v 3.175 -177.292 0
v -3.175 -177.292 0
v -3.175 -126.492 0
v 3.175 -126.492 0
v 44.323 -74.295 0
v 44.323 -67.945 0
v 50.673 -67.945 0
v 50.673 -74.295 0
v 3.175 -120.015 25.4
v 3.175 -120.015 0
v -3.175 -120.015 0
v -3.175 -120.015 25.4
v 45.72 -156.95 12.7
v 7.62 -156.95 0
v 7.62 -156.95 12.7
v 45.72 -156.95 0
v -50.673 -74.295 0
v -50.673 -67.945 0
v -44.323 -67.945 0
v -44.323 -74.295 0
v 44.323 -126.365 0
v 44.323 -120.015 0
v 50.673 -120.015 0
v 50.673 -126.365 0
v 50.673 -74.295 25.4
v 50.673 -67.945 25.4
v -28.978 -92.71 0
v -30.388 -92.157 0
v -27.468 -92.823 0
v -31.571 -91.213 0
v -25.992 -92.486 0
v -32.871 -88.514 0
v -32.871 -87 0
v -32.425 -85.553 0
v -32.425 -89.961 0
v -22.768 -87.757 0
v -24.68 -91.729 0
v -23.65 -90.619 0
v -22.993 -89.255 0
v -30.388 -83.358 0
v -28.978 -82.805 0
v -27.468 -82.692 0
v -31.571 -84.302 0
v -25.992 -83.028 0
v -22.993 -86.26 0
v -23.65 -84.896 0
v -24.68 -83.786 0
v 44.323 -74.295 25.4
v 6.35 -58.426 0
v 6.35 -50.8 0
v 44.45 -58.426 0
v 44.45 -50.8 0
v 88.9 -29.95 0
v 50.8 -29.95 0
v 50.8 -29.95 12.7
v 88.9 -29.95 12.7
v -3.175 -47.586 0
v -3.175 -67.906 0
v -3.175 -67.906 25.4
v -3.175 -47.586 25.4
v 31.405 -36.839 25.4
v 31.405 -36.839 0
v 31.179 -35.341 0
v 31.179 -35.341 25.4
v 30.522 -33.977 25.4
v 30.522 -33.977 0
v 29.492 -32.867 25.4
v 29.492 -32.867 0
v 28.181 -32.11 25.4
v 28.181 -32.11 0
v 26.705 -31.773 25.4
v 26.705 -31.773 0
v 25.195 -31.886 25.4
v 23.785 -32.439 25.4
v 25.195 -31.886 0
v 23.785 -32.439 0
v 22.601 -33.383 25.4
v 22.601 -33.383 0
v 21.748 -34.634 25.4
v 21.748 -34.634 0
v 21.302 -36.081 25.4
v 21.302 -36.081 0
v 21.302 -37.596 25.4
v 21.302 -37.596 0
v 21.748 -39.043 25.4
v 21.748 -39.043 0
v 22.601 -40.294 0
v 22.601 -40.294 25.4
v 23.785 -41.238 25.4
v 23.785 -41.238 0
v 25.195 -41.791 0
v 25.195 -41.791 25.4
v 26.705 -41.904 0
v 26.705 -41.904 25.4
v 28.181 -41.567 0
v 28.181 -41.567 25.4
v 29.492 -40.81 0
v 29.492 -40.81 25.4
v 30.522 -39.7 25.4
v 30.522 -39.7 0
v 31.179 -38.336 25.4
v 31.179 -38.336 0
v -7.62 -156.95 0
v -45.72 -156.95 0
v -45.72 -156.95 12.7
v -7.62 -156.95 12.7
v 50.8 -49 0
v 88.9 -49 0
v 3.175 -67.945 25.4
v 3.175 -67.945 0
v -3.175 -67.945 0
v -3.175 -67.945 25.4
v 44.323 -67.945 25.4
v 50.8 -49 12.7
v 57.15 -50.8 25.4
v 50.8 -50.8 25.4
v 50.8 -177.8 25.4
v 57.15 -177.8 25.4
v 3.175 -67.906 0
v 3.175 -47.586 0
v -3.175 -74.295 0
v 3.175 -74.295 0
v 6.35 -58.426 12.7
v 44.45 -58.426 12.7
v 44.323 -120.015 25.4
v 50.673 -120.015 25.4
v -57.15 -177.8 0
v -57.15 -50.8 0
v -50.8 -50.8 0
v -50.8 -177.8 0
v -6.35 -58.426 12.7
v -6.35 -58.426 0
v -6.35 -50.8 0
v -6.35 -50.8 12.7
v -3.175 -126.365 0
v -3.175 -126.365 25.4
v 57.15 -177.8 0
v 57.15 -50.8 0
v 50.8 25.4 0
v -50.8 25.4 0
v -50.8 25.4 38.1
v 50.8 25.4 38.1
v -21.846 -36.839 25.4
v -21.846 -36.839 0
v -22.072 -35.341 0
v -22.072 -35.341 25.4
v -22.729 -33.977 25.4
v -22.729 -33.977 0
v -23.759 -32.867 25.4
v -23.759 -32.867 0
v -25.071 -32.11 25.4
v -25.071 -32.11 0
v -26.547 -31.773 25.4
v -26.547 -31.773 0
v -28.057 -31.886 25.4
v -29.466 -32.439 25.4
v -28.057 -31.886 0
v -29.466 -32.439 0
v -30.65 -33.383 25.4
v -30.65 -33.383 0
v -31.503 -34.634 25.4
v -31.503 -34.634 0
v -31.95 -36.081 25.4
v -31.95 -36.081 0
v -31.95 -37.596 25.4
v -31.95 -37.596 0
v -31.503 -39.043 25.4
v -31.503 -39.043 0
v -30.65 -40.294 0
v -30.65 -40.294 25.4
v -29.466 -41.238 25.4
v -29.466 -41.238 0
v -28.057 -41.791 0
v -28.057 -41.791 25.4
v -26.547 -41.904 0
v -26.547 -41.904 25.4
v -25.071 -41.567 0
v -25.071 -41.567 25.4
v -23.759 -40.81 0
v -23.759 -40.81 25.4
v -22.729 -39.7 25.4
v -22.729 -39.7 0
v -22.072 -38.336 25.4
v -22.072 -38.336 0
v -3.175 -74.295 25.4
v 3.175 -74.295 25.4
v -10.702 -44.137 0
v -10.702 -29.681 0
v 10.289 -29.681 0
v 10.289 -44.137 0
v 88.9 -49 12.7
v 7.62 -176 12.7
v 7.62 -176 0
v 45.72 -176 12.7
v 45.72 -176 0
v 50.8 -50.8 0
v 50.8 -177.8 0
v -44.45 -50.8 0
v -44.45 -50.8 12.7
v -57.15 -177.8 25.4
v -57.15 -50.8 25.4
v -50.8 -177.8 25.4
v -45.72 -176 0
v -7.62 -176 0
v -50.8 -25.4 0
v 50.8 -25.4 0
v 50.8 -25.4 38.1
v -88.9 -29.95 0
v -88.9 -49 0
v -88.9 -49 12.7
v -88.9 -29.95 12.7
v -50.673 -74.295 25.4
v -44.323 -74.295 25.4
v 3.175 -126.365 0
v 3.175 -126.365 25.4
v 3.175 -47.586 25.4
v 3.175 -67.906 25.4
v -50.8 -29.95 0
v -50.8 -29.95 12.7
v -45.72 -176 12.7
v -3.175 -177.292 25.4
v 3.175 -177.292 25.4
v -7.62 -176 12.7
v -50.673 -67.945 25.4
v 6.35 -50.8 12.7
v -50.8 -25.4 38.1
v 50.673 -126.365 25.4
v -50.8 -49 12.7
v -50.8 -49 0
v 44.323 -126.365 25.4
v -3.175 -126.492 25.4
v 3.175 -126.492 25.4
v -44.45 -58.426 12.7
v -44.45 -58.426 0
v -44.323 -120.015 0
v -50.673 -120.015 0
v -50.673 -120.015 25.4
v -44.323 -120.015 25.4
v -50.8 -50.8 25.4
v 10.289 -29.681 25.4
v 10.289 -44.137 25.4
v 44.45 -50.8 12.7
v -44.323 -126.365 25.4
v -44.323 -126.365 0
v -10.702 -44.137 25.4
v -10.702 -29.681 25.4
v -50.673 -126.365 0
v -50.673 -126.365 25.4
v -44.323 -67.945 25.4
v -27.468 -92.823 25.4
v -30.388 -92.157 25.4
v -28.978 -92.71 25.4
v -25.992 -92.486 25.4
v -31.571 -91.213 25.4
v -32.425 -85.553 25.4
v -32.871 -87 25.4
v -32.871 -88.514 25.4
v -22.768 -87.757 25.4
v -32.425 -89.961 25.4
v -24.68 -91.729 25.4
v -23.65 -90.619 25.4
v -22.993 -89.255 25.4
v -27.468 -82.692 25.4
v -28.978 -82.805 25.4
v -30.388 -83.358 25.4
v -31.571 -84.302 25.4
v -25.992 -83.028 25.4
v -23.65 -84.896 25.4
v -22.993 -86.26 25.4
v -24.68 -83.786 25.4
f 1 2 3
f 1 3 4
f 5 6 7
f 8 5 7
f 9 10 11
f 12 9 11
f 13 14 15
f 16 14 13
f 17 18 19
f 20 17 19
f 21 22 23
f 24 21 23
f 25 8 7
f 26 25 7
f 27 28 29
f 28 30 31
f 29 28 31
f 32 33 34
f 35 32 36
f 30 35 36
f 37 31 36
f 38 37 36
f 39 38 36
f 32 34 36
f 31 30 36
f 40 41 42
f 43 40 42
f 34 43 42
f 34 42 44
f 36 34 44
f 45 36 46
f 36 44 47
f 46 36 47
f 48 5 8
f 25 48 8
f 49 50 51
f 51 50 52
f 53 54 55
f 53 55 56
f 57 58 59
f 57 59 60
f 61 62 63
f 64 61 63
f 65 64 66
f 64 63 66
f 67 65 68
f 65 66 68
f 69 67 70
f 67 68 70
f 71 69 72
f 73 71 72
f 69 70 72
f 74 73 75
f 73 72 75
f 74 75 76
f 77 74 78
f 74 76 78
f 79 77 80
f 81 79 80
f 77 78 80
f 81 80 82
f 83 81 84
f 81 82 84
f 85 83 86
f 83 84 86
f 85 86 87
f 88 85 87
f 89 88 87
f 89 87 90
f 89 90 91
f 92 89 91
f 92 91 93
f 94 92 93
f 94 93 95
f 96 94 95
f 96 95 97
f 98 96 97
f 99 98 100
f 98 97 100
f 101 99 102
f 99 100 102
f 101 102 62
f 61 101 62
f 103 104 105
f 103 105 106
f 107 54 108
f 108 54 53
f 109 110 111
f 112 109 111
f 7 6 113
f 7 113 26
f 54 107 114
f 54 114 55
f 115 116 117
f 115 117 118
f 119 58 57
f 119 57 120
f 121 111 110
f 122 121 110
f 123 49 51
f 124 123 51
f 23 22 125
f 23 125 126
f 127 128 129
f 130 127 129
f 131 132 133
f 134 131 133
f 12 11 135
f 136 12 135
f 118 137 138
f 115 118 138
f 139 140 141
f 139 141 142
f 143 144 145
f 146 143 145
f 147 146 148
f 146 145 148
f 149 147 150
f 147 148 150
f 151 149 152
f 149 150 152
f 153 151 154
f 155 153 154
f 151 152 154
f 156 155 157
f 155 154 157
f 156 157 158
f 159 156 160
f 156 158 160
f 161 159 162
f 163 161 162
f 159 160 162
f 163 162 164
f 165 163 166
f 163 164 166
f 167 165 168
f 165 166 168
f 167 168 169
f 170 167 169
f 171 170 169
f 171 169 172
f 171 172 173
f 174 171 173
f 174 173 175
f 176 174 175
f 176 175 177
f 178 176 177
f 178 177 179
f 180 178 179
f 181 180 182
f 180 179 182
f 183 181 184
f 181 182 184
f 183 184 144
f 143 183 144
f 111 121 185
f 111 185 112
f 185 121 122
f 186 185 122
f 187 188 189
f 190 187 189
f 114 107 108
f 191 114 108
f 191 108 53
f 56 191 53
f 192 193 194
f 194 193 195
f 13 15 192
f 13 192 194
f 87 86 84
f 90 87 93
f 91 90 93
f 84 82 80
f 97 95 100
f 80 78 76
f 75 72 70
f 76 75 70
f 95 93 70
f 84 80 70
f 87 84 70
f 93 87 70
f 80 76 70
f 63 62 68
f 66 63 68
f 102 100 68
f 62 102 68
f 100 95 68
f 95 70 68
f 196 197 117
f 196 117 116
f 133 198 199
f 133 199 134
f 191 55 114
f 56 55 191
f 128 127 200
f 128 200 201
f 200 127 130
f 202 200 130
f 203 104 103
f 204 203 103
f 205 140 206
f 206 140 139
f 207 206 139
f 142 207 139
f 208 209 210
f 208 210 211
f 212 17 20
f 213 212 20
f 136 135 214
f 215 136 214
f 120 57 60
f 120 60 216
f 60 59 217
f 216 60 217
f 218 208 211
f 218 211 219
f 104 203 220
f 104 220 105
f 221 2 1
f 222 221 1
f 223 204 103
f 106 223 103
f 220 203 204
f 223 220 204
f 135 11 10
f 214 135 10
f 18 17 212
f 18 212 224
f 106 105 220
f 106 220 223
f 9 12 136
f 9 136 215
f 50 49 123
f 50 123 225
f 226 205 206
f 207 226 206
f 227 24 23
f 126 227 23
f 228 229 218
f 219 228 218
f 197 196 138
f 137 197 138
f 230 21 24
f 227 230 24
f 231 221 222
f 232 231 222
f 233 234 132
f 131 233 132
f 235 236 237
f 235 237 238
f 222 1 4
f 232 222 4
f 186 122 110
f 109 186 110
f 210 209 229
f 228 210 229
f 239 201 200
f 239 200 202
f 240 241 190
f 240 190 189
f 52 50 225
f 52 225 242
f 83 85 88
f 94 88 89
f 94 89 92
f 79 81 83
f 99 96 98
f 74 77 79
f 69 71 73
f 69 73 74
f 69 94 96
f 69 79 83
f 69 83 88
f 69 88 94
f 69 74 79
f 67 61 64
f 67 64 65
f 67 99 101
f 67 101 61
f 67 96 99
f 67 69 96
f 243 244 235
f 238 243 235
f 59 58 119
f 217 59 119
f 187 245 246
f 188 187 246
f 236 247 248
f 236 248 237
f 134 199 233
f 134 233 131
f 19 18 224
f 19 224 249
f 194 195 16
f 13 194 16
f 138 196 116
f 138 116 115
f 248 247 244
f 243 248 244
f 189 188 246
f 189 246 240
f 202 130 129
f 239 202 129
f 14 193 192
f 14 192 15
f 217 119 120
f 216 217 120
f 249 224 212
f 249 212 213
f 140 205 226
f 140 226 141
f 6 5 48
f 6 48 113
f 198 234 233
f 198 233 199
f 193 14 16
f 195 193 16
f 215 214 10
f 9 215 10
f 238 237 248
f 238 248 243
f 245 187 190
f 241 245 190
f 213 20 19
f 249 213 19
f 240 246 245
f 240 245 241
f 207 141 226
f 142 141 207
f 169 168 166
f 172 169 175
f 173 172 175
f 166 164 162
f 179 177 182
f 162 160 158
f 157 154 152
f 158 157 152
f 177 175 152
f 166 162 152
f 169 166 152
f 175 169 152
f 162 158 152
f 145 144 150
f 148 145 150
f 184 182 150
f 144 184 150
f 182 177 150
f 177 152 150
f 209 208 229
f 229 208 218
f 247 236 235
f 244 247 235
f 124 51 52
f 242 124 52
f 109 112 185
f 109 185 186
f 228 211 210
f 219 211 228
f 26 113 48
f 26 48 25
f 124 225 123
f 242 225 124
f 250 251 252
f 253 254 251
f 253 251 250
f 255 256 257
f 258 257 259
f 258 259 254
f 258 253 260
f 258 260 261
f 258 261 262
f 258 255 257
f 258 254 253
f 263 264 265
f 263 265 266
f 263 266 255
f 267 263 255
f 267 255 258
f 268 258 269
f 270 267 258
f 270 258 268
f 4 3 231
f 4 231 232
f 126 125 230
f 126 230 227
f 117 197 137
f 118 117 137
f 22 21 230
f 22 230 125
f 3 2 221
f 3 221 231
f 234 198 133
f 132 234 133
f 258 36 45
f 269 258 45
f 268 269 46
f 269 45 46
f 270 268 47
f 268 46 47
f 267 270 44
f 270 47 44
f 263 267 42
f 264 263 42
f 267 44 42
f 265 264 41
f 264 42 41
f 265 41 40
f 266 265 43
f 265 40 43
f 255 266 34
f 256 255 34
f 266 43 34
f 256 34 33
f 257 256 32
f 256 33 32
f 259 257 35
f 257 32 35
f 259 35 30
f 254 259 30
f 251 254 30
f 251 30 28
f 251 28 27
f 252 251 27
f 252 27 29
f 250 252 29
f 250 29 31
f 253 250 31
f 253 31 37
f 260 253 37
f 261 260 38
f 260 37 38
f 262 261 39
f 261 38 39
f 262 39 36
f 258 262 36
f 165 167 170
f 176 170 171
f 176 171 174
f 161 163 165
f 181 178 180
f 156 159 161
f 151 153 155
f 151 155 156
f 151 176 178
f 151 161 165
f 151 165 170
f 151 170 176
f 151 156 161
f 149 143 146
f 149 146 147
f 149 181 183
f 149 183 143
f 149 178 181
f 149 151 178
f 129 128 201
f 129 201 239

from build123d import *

# Parameters (mm, degrees)
F0_W      = 101.6
F0_H      = 50.8
F1_DEPTH  = 38.1
F2_W      = 38.1
F2_H      = 7.6261752665
F3_DEPTH  = 12.7
F4_W      = 6.35
F4_H      = 20.32
F5_DEPTH  = 25.4
F6_W      = 6.35
F6_H      = 127
F7_DEPTH  = 25.4
F8_W      = 3.175
F8_H      = 6.35
F9_DEPTH  = 25.4
F8_W_2    = 6.35
F10_W     = 6.35
F10_H     = 50.8
F12_DEPTH = 25.4
F13_W     = 38.1
F13_H     = 19.05
F14_DEPTH = 12.7
F15_R     = 5.08
F16_DEPTH = 25.4
F17_W     = 20.9910012782
F17_H     = 14.4560653716
F18_DEPTH = 25.4


# Not quite as in the source:
# - the program builds the solid bodies; features that only make, move or delete a surface that nothing else refers to are left out


with BuildPart() as f1:
    # F0 (on Top) → F1 (new body)
    with BuildSketch(Plane.XY):
        Rectangle(F0_W, F0_H)
    extrude(amount=F1_DEPTH)


with BuildPart() as f3:
    # F2 (on Top) → F3 (new body)
    with BuildSketch(Plane.XY):
        with Locations((-25.4, -54.6130876333)):
            Rectangle(F2_W, F2_H)
    extrude(amount=F3_DEPTH)


with BuildPart() as f3b:
    # F2 (on Top) → F3, piece 2 (new body)
    with BuildSketch(Plane.XY):
        with Locations((25.4, -54.6130876333)):
            Rectangle(F2_W, F2_H)
    extrude(amount=F3_DEPTH)


with BuildPart() as f5:
    # F4 (on Top) → F5 (new body)
    with BuildSketch(Plane.XY):
        with Locations((0, -57.74644104)):
            Rectangle(F4_W, F4_H)
    extrude(amount=F5_DEPTH)


with BuildPart() as f7:
    # F6 (on Top) → F7 (new body)
    with BuildSketch(Plane.XY):
        with Locations((-53.975, -114.3)):
            Rectangle(F6_W, F6_H)
    extrude(amount=F7_DEPTH)


with BuildPart() as f7b:
    # F6 (on Top) → F7, piece 2 (new body)
    with BuildSketch(Plane.XY):
        with Locations((53.975, -114.3)):
            Rectangle(F6_W, F6_H)
    extrude(amount=F7_DEPTH)


with BuildPart() as f9:
    # F8 (on Top) → F9 (new body)
    with BuildSketch(Plane.XY):
        with Locations((1.5875, -71.12)):
            Rectangle(F8_W, F8_H)
        with Locations((-1.5875, -71.12)):
            Rectangle(F8_W, F8_H)
    extrude(amount=F9_DEPTH)


with BuildPart() as f9b:
    # F8 (on Top) → F9, piece 2 (new body)
    with BuildSketch(Plane.XY):
        with Locations((47.498, -71.12)):
            Rectangle(F8_W_2, F8_H)
    extrude(amount=F9_DEPTH)


with BuildPart() as f9c:
    # F8 (on Top) → F9, piece 3 (new body)
    with BuildSketch(Plane.XY):
        with Locations((-47.498, -71.12)):
            Rectangle(F8_W_2, F8_H)
    extrude(amount=F9_DEPTH)


with BuildPart() as f9d:
    # F8 (on Top) → F9, piece 4 (new body)
    with BuildSketch(Plane.XY):
        with Locations((47.498, -123.19)):
            Rectangle(F8_W_2, F8_H)
    extrude(amount=F9_DEPTH)


with BuildPart() as f9e:
    # F8 (on Top) → F9, piece 5 (new body)
    with BuildSketch(Plane.XY):
        Polygon((0, -126.365), (3.175, -126.365), (3.175, -120.015), (0, -120.015), (-3.175, -120.015), (-3.175, -126.365), align=None)
    extrude(amount=F9_DEPTH)


with BuildPart() as f9f:
    # F8 (on Top) → F9, piece 6 (new body)
    with BuildSketch(Plane.XY):
        with Locations((-47.498, -123.19)):
            Rectangle(F8_W_2, F8_H)
    extrude(amount=F9_DEPTH)


with BuildPart() as f12:
    # F10 (on Top) → F12 (new body)
    with BuildSketch(Plane.XY):
        with Locations((0, -151.892)):
            Rectangle(F10_W, F10_H)
    extrude(amount=F12_DEPTH)


with BuildPart() as f14:
    # F13 (on Top) → F14 (new body)
    with BuildSketch(Plane.XY):
        with Locations((-69.85, -39.475132829)):
            Rectangle(F13_W, F13_H)
    extrude(amount=F14_DEPTH)


with BuildPart() as f14b:
    # F13 (on Top) → F14, piece 2 (new body)
    with BuildSketch(Plane.XY):
        with Locations((69.85, -39.475132829)):
            Rectangle(F13_W, F13_H)
    extrude(amount=F14_DEPTH)


with BuildPart() as f14c:
    # F13 (on Top) → F14, piece 3 (new body)
    with BuildSketch(Plane.XY):
        with Locations((26.67, -166.475132829)):
            Rectangle(F13_W, F13_H)
    extrude(amount=F14_DEPTH)


with BuildPart() as f14d:
    # F13 (on Top) → F14, piece 4 (new body)
    with BuildSketch(Plane.XY):
        with Locations((-26.67, -166.475132829)):
            Rectangle(F13_W, F13_H)
    extrude(amount=F14_DEPTH)


with BuildPart() as f16:
    # F15 (on Top) → F16 (new body)
    with BuildSketch(Plane.XY):
        with Locations((-27.8475936502, -87.757319212)):
            Circle(F15_R)
    extrude(amount=F16_DEPTH)


with BuildPart() as f16b:
    # F15 (on Top) → F16, piece 2 (new body)
    with BuildSketch(Plane.XY):
        with Locations((-26.9264988601, -36.8386283517)):
            Circle(F15_R)
    extrude(amount=F16_DEPTH)


with BuildPart() as f16c:
    # F15 (on Top) → F16, piece 3 (new body)
    with BuildSketch(Plane.XY):
        with Locations((26.3249278069, -36.8386283517)):
            Circle(F15_R)
    extrude(amount=F16_DEPTH)


with BuildPart() as f18:
    # F17 (on Top) → F18 (new body)
    with BuildSketch(Plane.XY):
        with Locations((-0.2067787573, -36.9087895378)):
            Rectangle(F17_W, F17_H)
    extrude(amount=F18_DEPTH)


solid = Compound([f1.part, f3.part, f3b.part, f5.part, f7.part, f7b.part, f9.part, f9b.part, f9c.part, f9d.part, f9e.part, f9f.part, f12.part, f14.part, f14b.part, f14c.part, f14d.part, f16.part, f16b.part, f16c.part, f18.part])
